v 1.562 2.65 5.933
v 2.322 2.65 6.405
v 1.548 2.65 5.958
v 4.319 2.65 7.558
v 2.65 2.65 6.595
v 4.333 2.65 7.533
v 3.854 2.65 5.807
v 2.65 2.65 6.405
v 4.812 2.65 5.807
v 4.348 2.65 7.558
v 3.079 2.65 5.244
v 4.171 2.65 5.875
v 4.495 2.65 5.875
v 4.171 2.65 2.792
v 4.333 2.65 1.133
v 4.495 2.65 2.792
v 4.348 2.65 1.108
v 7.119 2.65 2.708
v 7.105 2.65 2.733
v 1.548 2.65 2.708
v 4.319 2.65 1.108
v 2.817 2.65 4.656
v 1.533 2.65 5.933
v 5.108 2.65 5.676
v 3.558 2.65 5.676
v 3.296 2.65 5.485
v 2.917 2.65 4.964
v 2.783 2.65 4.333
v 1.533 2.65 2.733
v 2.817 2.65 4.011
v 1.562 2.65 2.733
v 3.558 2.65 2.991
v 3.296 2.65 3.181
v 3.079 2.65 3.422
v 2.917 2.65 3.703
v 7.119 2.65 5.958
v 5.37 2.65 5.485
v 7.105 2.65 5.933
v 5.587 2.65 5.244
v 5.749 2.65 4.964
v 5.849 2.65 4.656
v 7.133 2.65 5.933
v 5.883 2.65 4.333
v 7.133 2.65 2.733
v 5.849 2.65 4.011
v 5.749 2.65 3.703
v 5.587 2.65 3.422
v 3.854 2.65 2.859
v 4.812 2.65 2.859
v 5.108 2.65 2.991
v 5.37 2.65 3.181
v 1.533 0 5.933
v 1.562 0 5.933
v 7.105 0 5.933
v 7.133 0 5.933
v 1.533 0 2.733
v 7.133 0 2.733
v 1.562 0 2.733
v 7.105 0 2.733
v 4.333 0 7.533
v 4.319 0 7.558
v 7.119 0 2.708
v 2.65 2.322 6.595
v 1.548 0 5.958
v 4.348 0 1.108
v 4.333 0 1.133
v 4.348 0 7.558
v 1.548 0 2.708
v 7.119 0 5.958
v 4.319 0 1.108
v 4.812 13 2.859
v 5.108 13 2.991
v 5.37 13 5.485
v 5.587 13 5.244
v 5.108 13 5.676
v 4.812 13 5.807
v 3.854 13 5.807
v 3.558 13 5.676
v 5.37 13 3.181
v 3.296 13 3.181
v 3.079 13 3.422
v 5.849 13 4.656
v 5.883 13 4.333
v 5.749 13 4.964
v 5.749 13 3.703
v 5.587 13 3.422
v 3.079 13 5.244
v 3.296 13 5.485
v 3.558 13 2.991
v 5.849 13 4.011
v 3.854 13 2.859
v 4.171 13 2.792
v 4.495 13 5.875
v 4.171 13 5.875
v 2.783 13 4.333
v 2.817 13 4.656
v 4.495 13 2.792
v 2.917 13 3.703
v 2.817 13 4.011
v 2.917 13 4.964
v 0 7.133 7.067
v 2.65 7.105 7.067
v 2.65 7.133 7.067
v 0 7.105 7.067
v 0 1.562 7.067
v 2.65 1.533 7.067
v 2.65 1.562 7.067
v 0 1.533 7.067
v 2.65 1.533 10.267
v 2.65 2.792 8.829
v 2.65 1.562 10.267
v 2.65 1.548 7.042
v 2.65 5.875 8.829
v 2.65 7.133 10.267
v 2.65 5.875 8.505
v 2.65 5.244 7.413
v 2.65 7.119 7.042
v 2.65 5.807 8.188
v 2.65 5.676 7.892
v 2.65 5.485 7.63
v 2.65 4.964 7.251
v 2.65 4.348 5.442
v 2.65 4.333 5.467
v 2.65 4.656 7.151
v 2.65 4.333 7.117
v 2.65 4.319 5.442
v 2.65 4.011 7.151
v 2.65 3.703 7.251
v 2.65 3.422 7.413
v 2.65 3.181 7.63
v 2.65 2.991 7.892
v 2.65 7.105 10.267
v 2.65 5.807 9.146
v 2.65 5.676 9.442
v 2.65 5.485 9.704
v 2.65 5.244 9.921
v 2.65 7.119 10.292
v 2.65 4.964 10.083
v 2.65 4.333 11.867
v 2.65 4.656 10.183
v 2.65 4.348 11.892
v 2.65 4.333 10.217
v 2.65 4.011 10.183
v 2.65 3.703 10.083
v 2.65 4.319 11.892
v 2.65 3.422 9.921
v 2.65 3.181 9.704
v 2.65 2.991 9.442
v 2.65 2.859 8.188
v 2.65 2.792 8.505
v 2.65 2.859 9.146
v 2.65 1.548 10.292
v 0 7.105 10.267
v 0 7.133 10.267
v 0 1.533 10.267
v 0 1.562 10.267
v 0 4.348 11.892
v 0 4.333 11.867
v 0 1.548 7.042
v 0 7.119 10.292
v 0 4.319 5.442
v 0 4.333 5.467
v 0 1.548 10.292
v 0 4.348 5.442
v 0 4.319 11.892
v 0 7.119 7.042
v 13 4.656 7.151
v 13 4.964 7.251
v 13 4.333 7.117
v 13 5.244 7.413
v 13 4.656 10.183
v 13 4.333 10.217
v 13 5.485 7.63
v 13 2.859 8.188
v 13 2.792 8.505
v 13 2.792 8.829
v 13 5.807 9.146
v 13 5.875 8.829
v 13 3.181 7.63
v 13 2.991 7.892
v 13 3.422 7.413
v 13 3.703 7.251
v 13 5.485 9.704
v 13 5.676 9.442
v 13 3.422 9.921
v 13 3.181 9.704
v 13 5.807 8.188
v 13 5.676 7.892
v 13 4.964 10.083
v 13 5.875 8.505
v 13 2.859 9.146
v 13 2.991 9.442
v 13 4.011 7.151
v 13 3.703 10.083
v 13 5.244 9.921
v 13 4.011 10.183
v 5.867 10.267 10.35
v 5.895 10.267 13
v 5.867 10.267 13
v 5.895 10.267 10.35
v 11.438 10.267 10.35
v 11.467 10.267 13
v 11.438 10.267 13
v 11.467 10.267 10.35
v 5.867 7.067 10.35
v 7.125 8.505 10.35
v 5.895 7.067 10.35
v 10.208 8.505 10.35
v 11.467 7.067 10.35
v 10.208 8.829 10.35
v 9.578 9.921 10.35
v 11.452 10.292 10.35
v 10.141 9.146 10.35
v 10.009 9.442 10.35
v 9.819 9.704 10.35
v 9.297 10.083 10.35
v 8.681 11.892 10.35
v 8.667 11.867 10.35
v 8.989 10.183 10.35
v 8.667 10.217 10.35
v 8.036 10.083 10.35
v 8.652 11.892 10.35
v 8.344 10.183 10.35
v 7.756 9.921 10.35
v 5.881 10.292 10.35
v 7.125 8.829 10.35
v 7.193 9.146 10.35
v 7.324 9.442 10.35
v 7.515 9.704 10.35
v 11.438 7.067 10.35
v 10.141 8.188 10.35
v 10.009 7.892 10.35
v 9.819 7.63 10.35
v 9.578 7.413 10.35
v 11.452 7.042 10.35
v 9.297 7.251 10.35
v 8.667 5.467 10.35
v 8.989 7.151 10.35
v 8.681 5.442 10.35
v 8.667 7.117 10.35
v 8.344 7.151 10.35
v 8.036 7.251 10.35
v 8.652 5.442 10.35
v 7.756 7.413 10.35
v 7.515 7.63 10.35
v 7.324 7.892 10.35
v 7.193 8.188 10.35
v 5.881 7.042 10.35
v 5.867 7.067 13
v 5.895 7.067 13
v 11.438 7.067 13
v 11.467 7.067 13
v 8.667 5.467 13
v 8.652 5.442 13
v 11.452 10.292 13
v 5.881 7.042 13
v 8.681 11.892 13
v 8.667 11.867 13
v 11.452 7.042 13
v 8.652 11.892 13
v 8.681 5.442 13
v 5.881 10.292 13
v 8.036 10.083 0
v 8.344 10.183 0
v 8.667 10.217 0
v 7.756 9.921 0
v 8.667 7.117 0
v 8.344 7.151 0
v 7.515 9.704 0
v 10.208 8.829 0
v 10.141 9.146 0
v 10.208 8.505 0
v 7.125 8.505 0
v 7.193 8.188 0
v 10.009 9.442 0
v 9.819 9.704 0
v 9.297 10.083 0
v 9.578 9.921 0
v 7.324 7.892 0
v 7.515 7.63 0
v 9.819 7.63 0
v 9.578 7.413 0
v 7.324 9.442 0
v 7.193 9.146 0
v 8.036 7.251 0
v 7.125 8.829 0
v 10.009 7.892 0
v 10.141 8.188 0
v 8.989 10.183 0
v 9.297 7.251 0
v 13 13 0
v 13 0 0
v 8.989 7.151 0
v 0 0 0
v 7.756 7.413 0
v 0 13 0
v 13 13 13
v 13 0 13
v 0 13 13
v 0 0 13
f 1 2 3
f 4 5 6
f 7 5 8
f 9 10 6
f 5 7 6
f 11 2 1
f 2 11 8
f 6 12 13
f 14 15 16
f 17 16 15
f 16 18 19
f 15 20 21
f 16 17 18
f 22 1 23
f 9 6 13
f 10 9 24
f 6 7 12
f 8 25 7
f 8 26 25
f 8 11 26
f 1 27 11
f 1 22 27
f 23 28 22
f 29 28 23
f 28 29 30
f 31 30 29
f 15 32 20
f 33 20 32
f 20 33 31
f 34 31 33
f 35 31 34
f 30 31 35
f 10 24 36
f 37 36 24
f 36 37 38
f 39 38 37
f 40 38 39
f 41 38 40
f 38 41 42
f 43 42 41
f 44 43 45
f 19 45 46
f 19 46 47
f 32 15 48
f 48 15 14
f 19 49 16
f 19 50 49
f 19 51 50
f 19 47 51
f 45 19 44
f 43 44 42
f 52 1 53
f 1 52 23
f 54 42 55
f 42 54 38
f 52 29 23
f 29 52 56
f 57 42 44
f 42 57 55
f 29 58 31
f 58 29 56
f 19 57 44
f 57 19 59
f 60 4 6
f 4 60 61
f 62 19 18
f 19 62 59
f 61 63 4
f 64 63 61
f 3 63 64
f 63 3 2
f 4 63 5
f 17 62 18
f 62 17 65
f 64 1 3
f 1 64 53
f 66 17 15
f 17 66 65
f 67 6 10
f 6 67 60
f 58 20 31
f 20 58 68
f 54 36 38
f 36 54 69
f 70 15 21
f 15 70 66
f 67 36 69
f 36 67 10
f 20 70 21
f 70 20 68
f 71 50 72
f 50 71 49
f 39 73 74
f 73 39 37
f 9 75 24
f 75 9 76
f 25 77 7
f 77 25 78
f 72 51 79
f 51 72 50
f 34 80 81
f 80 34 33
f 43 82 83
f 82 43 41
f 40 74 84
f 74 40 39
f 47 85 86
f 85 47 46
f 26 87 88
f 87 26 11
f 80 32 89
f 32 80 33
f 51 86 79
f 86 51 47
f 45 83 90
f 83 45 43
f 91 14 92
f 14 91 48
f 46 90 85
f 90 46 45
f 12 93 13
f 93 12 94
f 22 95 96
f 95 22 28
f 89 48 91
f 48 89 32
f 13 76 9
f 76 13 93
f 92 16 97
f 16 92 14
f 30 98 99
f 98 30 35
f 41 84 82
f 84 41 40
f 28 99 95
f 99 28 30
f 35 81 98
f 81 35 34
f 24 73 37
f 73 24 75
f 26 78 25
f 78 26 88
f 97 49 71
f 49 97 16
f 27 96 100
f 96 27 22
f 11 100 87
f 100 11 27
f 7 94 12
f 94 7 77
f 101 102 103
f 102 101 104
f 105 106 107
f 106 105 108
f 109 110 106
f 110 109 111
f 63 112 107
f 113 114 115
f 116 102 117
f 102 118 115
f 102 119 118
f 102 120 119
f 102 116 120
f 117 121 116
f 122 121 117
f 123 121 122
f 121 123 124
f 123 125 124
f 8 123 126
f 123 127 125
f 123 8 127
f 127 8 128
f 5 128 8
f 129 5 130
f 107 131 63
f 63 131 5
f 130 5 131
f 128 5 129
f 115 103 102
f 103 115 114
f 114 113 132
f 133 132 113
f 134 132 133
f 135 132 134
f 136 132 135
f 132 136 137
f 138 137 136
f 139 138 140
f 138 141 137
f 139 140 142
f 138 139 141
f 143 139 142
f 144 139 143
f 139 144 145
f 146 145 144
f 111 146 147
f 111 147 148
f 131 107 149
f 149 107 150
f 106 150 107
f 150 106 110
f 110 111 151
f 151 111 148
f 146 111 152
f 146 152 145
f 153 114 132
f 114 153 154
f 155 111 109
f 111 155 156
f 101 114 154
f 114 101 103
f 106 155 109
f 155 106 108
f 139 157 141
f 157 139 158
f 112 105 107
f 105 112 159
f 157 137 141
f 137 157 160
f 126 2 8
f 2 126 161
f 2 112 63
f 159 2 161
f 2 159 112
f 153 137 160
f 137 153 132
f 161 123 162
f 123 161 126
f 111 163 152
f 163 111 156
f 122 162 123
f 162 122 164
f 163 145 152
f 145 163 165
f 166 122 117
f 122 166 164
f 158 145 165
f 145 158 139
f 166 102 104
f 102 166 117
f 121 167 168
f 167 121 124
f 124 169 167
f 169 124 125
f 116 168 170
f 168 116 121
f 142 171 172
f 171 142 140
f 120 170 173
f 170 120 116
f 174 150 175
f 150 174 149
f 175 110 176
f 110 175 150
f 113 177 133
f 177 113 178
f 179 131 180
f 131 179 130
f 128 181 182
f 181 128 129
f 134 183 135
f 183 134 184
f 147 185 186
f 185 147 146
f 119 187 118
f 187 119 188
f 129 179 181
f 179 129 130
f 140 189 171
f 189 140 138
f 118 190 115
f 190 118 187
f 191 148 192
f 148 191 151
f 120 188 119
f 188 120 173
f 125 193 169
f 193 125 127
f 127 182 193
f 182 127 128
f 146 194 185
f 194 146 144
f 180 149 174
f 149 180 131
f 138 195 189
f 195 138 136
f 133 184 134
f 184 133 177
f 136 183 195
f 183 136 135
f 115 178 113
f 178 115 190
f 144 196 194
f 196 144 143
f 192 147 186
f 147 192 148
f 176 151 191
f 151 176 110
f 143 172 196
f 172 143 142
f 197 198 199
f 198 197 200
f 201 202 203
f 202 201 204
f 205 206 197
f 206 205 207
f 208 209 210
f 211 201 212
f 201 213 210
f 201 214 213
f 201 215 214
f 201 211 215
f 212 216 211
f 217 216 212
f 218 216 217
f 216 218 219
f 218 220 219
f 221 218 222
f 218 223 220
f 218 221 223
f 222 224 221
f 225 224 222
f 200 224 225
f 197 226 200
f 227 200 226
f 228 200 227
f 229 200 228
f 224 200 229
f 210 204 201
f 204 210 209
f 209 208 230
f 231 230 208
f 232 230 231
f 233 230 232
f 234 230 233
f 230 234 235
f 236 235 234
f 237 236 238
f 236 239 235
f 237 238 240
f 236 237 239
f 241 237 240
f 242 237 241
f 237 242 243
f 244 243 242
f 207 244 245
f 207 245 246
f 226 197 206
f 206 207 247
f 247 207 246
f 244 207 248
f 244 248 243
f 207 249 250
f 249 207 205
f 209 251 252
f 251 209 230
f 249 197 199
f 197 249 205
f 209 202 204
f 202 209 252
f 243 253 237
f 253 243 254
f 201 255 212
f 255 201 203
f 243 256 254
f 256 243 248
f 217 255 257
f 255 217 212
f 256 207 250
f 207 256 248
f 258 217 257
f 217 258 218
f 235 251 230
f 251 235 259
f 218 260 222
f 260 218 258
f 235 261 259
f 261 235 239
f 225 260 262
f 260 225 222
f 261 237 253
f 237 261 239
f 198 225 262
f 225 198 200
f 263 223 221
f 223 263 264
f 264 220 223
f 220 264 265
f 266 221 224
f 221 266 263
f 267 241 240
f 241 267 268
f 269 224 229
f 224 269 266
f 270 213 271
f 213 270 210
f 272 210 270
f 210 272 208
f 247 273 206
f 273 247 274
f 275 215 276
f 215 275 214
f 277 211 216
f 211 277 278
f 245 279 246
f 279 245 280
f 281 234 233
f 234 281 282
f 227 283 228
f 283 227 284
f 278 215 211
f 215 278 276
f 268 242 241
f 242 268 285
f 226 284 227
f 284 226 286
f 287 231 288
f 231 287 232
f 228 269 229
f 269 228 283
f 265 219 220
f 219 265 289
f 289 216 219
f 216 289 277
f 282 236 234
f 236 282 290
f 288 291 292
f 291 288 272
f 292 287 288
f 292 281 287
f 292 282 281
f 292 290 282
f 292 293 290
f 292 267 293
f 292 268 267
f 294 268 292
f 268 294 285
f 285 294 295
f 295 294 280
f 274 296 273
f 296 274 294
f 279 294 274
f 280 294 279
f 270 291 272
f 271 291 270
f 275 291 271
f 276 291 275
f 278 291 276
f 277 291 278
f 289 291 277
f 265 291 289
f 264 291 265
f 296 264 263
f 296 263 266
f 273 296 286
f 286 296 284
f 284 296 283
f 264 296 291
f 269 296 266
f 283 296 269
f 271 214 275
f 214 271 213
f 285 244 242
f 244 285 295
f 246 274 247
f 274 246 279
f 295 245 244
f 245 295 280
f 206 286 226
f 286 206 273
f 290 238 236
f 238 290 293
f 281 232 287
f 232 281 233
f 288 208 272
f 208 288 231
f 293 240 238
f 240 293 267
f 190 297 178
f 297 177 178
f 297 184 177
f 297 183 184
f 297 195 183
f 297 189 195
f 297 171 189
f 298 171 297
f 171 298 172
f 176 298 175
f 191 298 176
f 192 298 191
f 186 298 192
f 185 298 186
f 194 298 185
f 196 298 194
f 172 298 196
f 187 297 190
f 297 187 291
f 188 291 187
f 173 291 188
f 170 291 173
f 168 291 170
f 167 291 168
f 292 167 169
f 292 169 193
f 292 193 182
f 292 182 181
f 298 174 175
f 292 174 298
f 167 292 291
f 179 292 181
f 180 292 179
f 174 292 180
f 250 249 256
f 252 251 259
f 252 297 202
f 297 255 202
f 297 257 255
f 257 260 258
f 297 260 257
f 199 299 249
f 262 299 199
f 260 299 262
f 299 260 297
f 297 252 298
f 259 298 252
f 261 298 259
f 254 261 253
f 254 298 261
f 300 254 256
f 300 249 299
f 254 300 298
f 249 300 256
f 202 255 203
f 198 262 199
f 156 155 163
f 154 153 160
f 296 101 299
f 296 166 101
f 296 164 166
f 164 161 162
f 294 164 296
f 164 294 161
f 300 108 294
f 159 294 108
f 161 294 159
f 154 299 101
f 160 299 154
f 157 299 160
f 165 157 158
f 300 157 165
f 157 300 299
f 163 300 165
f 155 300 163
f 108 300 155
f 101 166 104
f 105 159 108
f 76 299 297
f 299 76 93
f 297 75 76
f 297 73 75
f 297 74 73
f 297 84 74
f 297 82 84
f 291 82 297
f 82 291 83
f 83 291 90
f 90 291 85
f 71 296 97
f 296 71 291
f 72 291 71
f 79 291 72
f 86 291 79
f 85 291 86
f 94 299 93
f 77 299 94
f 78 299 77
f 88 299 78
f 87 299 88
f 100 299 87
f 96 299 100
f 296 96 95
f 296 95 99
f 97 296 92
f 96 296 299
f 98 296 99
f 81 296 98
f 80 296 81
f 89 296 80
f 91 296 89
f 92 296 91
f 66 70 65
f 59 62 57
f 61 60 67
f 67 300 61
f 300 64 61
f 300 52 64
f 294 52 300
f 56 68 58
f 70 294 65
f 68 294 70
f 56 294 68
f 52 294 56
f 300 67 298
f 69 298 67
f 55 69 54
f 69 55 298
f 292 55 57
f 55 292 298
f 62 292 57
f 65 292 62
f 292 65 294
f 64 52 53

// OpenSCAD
/* Copyright (C) Peter Ivanov <ivanovp@gmail.com>, 2016 */
/* License: Creative Commons - Attribution - Non-commercial (CC BY-NC) */

cube_size = 13; // [10:50]
// M3 = 5.5 mm, M4 = 7 mm, M5 = 8 mm, M6 = 10 mm
nut_size = 5.5; // [5:0.1:20]
// M3 = 3 mm, M6 = 6 mm, and so on...
nut_diameter = 3; // [3:0.1:20]
// M3 = 2.6 mm, M4 = 3.44 mm, M5 = 4.24 mm, M6 = 5.24 mm
nut_height = 2.6; // [2:0.1:15]
// Only three nuts should be installed anyway
nut_sinks_on_all_sides = 0; // [0:No, 1:Yes]
// Allowance, it will be added to nut size, diameter and height
epsilon = 0.1; // [0.0:0.05:0.5]
//epsilon = 0.1; // tul keves
//epsilon = 0.5; // tul sok

/* [Hidden] */
fn = 30;

difference()
{
    cube(cube_size, cube_size, cube_size);
    translate([cube_size / 3, 0, cube_size / 3]) 
    {
        rotate([-90, 0, 0]) 
        {
            translate([0, 0, cube_size]) hexagon(nut_size + epsilon, (nut_height * 2 + epsilon) * nut_sinks_on_all_sides, 0);
            cylinder(d = nut_diameter + epsilon, h = cube_size + epsilon, $fn=fn);
            hexagon(nut_size + epsilon, nut_height * 2 + epsilon, 90);
        }
    }
    translate([0, cube_size / 3, cube_size * 2 / 3]) 
    {
        rotate([0, 90, 0]) 
        {
            translate([0, 0, cube_size]) hexagon(nut_size + epsilon, (nut_height * 2 + epsilon) * nut_sinks_on_all_sides, 0);
            cylinder(d = nut_diameter + epsilon, h = cube_size + epsilon, $fn=fn);
            
            hexagon(nut_size + epsilon, nut_height * 2 + epsilon, 0);
        }
    }
    translate([cube_size * 2 / 3 , cube_size * 2 / 3, 0]) 
    {
        rotate([0, 0, 90]) 
        {
            translate([0, 0, cube_size]) hexagon(nut_size + epsilon, nut_height * 2 + epsilon, 0);
            cylinder(d = nut_diameter + epsilon, h = cube_size + epsilon, $fn=fn);
            hexagon(nut_size + epsilon, (nut_height * 2 + epsilon) * nut_sinks_on_all_sides, 0);
        }
    }
}

module hexagon(width, height, baseAngle) 
{
  bwidth = width / 1.75;
  for (angle = [baseAngle, baseAngle + 60, baseAngle + 120]) 
  {
      rotate([0, 0, angle]) cube([bwidth, width, height], true);
  }
}
